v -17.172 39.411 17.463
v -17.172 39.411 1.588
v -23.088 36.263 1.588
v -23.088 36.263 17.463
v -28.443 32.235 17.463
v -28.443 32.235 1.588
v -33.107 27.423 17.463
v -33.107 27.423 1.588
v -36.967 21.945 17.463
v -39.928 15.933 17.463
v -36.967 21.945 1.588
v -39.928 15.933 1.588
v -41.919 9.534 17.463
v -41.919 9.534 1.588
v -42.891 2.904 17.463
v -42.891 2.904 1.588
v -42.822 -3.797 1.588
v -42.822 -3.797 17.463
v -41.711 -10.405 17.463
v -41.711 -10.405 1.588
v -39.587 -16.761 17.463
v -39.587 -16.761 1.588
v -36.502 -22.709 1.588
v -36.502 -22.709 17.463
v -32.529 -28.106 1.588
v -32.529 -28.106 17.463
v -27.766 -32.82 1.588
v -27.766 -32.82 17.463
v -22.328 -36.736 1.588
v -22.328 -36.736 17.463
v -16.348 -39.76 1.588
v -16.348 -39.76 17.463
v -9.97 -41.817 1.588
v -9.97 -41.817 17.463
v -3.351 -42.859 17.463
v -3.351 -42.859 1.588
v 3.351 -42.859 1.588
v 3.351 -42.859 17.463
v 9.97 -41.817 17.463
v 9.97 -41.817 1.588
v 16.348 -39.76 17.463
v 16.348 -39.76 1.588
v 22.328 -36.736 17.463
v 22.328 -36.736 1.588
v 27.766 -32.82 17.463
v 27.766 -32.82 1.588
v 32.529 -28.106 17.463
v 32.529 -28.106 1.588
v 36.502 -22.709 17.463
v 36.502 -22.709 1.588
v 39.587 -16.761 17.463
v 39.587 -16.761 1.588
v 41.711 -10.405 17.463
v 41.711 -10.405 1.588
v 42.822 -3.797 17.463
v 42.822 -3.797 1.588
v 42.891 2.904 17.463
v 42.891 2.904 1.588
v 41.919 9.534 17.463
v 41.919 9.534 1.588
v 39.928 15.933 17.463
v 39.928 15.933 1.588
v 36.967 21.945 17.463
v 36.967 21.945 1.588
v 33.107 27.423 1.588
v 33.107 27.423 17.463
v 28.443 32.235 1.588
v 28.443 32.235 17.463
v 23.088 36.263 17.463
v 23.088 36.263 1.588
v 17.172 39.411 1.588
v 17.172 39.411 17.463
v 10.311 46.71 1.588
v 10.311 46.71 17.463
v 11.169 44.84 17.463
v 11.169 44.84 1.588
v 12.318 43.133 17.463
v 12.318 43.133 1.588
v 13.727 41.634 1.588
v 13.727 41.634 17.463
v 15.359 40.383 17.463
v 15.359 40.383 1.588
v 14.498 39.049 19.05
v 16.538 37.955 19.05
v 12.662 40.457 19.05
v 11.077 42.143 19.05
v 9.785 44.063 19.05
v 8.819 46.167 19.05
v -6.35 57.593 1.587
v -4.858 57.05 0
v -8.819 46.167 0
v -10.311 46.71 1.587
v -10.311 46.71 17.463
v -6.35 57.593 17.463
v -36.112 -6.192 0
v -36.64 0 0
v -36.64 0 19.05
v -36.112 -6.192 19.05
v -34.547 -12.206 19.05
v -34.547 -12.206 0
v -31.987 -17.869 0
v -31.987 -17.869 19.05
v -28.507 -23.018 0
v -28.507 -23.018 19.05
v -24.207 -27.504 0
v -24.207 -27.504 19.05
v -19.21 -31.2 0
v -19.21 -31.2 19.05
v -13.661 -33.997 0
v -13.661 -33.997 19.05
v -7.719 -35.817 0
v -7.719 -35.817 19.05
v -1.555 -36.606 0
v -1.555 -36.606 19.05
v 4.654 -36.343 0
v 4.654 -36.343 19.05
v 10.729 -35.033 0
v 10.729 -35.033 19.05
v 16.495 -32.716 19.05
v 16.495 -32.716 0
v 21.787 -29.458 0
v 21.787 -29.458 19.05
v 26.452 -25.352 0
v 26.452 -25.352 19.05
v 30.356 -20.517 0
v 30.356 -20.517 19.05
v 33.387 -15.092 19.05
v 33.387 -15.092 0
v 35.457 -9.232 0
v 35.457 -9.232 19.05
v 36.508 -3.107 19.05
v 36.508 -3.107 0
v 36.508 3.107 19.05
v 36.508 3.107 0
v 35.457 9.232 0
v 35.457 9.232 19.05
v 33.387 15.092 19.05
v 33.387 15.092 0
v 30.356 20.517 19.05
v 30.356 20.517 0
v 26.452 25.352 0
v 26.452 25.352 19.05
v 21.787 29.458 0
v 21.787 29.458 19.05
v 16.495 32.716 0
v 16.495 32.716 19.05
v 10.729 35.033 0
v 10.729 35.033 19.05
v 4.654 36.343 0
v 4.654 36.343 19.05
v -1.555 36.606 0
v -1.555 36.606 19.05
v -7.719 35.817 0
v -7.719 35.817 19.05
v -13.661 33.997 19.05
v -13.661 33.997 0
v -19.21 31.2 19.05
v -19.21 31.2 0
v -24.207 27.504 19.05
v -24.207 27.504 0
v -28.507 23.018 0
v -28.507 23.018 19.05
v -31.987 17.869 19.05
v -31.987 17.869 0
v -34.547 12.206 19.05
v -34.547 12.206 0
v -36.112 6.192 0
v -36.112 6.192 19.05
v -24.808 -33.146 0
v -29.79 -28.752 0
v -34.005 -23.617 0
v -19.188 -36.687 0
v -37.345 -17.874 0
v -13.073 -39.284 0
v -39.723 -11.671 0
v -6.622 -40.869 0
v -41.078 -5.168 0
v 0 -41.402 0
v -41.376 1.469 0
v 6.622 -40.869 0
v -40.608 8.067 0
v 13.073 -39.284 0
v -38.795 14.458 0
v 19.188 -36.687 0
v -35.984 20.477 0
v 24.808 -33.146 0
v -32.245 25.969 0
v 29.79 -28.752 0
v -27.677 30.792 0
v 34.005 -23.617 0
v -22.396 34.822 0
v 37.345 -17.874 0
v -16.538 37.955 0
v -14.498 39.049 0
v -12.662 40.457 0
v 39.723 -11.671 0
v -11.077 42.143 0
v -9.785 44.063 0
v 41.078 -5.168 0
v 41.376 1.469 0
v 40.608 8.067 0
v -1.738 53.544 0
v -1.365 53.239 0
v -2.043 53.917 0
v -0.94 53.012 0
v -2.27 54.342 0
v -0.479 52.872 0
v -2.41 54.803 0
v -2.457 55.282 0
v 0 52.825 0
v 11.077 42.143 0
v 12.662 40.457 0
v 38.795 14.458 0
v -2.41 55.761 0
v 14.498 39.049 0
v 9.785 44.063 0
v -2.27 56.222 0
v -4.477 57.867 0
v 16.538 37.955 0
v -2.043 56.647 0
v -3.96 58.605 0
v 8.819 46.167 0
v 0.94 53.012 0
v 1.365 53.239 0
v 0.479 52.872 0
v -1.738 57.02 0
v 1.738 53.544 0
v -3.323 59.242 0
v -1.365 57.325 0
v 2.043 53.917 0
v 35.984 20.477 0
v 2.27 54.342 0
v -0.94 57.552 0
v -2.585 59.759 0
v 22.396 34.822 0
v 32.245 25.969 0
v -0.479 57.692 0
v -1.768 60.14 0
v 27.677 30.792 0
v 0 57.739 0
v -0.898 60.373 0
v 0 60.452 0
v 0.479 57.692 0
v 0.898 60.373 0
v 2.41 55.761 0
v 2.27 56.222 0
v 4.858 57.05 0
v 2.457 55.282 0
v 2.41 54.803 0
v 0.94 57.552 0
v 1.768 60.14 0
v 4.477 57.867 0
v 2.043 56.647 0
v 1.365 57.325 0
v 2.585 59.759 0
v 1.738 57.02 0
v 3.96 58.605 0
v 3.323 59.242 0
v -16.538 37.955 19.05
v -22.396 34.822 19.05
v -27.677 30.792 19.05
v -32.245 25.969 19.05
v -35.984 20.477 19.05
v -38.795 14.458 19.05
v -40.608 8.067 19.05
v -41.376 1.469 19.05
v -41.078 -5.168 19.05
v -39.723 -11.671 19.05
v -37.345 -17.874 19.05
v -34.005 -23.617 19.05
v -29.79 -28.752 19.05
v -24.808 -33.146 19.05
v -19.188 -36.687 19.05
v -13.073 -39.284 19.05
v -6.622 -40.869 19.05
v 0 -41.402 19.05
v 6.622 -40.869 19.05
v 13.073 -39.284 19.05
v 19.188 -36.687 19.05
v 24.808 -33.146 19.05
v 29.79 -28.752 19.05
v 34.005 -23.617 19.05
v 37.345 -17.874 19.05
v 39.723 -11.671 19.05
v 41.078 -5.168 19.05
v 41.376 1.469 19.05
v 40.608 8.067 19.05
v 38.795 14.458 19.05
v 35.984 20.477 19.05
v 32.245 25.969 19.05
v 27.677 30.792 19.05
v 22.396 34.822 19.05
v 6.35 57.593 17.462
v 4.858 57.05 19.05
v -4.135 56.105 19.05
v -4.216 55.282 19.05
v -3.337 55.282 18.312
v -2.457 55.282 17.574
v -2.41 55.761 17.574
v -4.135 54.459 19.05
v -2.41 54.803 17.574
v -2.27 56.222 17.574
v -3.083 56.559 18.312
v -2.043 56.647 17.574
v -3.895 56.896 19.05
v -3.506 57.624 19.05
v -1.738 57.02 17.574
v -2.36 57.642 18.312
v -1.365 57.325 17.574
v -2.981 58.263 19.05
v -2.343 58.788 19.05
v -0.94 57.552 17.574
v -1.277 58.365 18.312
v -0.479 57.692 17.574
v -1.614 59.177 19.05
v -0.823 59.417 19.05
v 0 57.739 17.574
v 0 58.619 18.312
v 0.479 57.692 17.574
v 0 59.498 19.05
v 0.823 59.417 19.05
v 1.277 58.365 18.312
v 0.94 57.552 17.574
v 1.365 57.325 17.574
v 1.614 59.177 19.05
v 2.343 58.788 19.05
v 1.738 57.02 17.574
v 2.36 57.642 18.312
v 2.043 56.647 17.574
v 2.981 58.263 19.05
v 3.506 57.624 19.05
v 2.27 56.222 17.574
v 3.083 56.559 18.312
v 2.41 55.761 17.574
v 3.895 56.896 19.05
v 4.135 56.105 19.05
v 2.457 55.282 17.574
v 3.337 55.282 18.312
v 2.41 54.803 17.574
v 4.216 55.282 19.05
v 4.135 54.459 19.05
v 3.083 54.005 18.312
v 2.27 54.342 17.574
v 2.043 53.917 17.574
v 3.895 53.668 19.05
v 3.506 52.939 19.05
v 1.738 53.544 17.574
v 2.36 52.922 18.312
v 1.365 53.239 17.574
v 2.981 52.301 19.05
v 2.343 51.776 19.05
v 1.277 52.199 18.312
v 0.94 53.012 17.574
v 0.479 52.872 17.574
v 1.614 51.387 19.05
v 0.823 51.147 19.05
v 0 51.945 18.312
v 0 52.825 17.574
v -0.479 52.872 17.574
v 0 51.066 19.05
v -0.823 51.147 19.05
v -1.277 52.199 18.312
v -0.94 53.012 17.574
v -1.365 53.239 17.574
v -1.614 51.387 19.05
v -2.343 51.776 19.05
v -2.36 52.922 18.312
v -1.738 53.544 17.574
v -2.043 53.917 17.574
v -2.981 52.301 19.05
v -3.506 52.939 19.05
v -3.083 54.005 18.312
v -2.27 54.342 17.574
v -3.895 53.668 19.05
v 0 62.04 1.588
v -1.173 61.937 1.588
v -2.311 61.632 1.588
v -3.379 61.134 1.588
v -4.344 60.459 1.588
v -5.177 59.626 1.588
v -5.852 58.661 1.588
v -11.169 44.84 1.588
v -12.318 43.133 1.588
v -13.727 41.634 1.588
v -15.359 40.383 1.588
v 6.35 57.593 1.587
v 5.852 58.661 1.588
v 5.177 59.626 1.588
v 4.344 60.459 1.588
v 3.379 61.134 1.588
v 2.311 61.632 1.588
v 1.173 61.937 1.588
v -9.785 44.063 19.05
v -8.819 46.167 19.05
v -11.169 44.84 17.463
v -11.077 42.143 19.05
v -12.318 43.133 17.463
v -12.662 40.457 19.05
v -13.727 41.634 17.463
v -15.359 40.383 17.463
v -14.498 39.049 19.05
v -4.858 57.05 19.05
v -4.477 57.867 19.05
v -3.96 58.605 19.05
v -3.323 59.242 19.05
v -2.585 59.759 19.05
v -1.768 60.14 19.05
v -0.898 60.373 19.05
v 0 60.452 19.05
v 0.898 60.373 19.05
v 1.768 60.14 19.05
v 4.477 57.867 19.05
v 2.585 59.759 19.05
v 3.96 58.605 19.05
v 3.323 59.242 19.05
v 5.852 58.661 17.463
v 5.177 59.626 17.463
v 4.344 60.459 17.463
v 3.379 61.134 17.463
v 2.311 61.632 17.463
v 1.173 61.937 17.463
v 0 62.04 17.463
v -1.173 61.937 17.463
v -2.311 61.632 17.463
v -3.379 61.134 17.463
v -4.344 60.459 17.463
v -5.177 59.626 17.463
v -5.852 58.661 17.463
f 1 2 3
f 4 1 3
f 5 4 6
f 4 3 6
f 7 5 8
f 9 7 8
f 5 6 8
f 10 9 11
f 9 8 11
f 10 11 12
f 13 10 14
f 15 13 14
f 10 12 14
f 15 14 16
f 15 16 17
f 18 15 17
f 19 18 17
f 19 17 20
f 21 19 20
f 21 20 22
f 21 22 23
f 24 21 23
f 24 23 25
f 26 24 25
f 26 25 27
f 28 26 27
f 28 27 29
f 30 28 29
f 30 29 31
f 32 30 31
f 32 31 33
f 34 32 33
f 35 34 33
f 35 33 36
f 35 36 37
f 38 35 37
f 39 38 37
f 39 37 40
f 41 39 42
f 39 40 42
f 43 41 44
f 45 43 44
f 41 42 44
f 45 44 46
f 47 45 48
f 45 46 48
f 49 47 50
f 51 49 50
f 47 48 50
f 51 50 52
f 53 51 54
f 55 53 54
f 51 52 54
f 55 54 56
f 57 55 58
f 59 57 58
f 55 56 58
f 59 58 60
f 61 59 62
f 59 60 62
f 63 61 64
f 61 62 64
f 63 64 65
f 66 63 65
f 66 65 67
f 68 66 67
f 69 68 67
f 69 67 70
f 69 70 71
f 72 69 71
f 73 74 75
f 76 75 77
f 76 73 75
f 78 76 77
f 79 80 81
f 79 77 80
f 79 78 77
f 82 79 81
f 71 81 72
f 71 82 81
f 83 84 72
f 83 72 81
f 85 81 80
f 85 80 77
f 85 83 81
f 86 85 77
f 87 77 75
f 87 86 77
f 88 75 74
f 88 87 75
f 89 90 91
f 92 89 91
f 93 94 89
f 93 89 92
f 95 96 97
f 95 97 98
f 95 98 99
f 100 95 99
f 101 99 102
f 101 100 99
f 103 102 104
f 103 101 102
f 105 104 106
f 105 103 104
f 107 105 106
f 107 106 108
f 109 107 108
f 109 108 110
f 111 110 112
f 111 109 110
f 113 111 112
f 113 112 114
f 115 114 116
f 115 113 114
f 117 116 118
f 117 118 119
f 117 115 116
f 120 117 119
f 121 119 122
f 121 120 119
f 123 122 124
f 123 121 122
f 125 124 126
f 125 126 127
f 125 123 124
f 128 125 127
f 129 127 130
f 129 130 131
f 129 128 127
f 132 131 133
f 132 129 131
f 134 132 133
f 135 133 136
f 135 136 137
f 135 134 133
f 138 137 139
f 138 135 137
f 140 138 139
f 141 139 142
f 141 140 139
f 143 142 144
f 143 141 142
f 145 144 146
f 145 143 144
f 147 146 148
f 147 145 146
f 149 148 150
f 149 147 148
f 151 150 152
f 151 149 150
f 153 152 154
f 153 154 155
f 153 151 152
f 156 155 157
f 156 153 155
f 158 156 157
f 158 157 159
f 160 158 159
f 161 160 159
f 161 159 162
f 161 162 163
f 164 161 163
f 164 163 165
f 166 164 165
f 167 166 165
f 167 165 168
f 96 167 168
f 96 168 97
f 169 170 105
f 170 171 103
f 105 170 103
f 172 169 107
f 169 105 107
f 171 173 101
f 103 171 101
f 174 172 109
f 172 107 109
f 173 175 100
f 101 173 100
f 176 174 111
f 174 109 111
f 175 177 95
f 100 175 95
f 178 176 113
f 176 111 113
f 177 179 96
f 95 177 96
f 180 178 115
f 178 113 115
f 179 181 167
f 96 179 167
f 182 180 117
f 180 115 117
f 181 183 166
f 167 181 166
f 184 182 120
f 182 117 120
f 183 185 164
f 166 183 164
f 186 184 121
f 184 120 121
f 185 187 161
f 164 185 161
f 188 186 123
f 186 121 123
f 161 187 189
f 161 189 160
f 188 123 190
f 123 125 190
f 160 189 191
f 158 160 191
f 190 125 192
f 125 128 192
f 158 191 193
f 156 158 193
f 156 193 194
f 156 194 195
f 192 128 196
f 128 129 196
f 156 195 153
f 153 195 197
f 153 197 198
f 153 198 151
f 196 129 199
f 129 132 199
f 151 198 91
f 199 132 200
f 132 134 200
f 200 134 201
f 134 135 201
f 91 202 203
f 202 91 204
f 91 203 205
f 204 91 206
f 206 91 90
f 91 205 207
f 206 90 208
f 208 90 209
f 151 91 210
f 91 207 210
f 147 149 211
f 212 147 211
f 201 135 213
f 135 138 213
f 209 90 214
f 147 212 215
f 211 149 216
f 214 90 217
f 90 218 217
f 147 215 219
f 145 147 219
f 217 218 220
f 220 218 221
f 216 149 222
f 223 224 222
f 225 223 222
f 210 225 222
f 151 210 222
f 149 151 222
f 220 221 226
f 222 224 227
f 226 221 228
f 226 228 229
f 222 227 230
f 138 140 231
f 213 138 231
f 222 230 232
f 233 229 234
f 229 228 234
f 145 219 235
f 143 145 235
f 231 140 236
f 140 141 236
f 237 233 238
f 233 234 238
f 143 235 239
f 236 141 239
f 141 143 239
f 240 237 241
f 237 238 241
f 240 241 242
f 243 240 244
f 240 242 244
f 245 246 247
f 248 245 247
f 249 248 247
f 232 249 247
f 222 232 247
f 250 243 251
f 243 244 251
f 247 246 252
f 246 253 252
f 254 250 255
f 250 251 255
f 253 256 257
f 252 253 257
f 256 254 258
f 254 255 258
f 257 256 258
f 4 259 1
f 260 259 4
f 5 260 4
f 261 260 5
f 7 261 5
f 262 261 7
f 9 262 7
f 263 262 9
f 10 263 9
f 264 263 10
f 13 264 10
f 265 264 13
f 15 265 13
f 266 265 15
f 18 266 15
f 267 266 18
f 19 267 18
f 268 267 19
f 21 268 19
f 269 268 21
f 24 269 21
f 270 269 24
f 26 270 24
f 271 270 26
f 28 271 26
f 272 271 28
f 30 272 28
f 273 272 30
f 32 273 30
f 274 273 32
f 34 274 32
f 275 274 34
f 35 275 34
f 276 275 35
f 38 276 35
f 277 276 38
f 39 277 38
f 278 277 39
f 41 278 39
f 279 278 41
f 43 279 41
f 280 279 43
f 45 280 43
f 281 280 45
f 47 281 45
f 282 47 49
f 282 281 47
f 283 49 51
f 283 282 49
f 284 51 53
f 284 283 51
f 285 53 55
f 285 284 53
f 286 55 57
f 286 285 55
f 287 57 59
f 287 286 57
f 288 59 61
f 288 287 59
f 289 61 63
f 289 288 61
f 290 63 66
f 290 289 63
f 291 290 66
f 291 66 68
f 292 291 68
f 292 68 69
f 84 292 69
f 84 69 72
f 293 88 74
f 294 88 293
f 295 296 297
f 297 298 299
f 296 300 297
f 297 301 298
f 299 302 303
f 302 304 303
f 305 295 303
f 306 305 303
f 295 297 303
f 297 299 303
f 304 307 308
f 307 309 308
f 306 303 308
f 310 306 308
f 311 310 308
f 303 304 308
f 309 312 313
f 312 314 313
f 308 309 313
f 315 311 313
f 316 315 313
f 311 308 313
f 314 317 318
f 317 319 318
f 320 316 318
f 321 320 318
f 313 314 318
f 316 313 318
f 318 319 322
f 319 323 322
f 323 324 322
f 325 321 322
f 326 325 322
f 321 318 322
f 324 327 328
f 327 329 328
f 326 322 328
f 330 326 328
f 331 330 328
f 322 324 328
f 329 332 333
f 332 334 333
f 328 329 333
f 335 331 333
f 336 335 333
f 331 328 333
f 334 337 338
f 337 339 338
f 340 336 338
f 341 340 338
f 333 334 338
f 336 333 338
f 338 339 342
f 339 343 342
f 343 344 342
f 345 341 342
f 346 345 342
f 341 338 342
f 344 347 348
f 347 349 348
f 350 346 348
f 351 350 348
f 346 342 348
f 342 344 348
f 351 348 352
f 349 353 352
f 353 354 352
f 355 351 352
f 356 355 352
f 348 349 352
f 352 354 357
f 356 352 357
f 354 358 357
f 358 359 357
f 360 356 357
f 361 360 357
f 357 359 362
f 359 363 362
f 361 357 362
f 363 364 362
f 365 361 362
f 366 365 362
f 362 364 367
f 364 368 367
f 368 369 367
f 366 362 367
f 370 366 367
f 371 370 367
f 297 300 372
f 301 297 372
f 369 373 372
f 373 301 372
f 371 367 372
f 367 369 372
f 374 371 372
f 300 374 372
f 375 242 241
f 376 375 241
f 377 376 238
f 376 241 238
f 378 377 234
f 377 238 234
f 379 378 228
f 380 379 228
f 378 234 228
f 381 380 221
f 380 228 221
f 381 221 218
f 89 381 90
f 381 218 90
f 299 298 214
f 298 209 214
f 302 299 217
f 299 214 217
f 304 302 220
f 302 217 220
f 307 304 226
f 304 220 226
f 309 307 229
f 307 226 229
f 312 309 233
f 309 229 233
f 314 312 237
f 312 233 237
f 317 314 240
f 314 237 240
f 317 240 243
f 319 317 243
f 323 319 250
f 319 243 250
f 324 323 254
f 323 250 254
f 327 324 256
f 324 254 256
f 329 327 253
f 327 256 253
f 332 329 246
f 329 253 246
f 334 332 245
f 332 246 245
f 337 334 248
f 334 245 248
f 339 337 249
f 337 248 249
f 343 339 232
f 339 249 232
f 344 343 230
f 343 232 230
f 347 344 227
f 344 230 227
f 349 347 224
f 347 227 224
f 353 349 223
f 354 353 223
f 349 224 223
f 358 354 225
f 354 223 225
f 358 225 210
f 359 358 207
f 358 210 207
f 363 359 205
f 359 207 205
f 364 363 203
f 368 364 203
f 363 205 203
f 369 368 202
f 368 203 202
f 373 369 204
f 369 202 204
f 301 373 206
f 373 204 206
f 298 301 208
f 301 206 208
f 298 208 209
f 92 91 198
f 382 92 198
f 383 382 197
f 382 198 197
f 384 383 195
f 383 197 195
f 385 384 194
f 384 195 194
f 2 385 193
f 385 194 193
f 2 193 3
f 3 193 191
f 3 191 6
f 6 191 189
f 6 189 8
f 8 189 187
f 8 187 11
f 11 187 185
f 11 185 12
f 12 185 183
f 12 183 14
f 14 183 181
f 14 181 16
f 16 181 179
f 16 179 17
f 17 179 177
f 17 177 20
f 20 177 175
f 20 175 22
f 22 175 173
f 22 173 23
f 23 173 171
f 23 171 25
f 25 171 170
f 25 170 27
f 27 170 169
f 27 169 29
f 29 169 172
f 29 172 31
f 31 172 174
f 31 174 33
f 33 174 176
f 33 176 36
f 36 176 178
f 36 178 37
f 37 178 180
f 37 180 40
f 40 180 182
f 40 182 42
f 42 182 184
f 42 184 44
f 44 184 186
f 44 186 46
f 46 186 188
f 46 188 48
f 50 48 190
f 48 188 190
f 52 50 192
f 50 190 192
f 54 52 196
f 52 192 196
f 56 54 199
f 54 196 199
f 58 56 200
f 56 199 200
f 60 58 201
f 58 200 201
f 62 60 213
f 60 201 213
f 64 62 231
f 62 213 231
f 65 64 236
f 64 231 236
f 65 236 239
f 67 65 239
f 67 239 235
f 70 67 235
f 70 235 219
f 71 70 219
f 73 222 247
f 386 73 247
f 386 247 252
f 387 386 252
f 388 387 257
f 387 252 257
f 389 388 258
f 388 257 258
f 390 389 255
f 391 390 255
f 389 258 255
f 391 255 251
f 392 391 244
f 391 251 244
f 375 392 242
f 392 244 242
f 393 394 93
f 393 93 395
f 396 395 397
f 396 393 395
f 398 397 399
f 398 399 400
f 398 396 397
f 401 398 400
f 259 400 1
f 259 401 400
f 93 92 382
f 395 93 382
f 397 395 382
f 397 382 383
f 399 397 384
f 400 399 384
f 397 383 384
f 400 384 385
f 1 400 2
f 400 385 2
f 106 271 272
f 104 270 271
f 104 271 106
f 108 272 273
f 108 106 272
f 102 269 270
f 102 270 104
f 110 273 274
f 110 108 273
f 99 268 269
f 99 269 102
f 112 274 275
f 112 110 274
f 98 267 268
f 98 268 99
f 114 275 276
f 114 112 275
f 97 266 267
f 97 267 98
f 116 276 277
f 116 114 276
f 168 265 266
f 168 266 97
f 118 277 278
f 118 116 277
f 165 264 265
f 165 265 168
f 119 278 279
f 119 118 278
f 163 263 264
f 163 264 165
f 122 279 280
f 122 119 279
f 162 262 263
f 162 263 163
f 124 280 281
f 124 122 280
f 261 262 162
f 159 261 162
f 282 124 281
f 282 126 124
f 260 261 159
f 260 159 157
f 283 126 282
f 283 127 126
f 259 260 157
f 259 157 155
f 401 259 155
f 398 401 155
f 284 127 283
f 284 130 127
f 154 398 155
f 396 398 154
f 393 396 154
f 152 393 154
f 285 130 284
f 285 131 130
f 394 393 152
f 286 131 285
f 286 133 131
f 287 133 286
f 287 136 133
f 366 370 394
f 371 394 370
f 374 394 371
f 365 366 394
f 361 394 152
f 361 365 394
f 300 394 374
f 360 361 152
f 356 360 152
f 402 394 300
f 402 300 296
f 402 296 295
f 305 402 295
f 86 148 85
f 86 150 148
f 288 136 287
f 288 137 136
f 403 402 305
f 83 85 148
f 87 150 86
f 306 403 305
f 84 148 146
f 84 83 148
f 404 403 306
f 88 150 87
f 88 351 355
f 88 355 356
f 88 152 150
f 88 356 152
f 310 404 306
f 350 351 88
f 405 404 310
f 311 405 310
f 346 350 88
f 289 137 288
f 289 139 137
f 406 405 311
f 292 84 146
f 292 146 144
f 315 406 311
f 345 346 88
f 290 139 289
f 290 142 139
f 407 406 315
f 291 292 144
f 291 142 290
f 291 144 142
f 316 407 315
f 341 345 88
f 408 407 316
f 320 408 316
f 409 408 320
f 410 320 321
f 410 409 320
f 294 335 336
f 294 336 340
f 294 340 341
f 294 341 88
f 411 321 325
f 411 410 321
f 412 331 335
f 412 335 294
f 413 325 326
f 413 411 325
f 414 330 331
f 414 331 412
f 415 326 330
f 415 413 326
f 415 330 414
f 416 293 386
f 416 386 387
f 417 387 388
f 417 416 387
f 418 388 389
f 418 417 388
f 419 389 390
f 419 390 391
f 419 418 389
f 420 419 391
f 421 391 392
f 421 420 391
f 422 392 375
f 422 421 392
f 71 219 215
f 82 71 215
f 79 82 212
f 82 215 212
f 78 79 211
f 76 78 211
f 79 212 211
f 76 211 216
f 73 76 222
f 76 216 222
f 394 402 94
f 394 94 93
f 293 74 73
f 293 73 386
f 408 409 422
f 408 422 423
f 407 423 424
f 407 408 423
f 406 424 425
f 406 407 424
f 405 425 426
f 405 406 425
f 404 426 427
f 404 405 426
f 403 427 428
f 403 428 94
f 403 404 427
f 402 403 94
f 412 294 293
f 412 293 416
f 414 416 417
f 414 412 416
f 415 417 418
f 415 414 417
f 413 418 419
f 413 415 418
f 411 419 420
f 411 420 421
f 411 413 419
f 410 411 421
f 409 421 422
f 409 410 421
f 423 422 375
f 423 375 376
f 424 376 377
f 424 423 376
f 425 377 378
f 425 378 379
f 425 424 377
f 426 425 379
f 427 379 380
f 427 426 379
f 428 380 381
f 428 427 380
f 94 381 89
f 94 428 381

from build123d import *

# Parameters (mm, degrees)
SKETCH1_R                                         = 42.9895
SKETCH1_R_2                                       = 36.6395
BOSS_EXTRUDE1_DEPTH                               = 19.05
BOSS_EXTRUDE2_DEPTH                               = 19.05
FILLET1_R                                         = 12.7
CHAMFER1_SIZE                                     = 1.5875
CSK_FOR_8_FLAT_HEAD_MACHINE_SCREW_100_D           = 4.9149
CSK_FOR_8_FLAT_HEAD_MACHINE_SCREW_100_CSINK_D     = 8.4328
CSK_FOR_8_FLAT_HEAD_MACHINE_SCREW_100_CSINK_ANGLE = 100


with BuildPart() as part:
    # Sketch1 → Boss-Extrude1 (new body)
    with BuildSketch(Plane.XY):
        with Locations(Location((0, 0, 0), (0, 0, 180))):
            Circle(SKETCH1_R)
        with Locations(Location((0, 0, 0), (0, 0, 180))):
            Circle(SKETCH1_R_2, mode=Mode.SUBTRACT)
    extrude(amount=BOSS_EXTRUDE1_DEPTH)

    # Sketch3 → Boss-Extrude2 (add, through all)
    with BuildSketch(Plane.XY.offset(19.05)):
        with BuildLine():
            Line((-6.35, 57.593182132), (-12.321797405, 41.18580361))
            ThreePointArc((-12.321797405, 41.18580361), (0, 42.926029516), (12.321797405, 41.18580361))
            Line((12.321797405, 41.18580361), (6.35, 57.593182132))
            ThreePointArc((6.35, 57.593182132), (3.875959319, 60.817414721), (0, 62.0395))
            ThreePointArc((0, 62.0395), (-3.875959319, 60.817414721), (-6.35, 57.593182132))
        make_face()
    extrude(amount=-BOSS_EXTRUDE2_DEPTH)

    # Fillet1
    fillet1_edges = [part.edges().sort_by_distance(p)[0] for p in [
        (12.321797405, 41.18580361, 9.525),
        (-12.321797405, 41.18580361, 9.525),
    ]]
    fillet(fillet1_edges, radius=FILLET1_R)

    # Chamfer1
    chamfer1_edges = [part.edges().sort_by_distance(p)[0] for p in [
        (0, 62.0395, 0),
        (-8.330591024, 52.151553016, 0),
        (-8.330591024, 52.151553016, 19.05),
        (0, 62.0395, 19.05),
        (0, -42.9895, 0),
        (0, -42.9895, 19.05),
        (8.330591024, 52.151553016, 19.05),
        (8.330591024, 52.151553016, 0),
        (12.991632469, 42.355301831, 19.05),
        (12.991632469, 42.355301831, 0),
        (-12.991632469, 42.355301831, 19.05),
        (-12.991632469, 42.355301831, 0),
    ]]
    chamfer(chamfer1_edges, length=CHAMFER1_SIZE)

    # CSK for #8 Flat Head Machine Screw (100)1 (through all)
    with Locations(Plane.XY.offset(19.05)):
        with Locations((0, 55.281971145)):
            CounterSinkHole(CSK_FOR_8_FLAT_HEAD_MACHINE_SCREW_100_D / 2, CSK_FOR_8_FLAT_HEAD_MACHINE_SCREW_100_CSINK_D / 2, counter_sink_angle=CSK_FOR_8_FLAT_HEAD_MACHINE_SCREW_100_CSINK_ANGLE)


solid = part.part
